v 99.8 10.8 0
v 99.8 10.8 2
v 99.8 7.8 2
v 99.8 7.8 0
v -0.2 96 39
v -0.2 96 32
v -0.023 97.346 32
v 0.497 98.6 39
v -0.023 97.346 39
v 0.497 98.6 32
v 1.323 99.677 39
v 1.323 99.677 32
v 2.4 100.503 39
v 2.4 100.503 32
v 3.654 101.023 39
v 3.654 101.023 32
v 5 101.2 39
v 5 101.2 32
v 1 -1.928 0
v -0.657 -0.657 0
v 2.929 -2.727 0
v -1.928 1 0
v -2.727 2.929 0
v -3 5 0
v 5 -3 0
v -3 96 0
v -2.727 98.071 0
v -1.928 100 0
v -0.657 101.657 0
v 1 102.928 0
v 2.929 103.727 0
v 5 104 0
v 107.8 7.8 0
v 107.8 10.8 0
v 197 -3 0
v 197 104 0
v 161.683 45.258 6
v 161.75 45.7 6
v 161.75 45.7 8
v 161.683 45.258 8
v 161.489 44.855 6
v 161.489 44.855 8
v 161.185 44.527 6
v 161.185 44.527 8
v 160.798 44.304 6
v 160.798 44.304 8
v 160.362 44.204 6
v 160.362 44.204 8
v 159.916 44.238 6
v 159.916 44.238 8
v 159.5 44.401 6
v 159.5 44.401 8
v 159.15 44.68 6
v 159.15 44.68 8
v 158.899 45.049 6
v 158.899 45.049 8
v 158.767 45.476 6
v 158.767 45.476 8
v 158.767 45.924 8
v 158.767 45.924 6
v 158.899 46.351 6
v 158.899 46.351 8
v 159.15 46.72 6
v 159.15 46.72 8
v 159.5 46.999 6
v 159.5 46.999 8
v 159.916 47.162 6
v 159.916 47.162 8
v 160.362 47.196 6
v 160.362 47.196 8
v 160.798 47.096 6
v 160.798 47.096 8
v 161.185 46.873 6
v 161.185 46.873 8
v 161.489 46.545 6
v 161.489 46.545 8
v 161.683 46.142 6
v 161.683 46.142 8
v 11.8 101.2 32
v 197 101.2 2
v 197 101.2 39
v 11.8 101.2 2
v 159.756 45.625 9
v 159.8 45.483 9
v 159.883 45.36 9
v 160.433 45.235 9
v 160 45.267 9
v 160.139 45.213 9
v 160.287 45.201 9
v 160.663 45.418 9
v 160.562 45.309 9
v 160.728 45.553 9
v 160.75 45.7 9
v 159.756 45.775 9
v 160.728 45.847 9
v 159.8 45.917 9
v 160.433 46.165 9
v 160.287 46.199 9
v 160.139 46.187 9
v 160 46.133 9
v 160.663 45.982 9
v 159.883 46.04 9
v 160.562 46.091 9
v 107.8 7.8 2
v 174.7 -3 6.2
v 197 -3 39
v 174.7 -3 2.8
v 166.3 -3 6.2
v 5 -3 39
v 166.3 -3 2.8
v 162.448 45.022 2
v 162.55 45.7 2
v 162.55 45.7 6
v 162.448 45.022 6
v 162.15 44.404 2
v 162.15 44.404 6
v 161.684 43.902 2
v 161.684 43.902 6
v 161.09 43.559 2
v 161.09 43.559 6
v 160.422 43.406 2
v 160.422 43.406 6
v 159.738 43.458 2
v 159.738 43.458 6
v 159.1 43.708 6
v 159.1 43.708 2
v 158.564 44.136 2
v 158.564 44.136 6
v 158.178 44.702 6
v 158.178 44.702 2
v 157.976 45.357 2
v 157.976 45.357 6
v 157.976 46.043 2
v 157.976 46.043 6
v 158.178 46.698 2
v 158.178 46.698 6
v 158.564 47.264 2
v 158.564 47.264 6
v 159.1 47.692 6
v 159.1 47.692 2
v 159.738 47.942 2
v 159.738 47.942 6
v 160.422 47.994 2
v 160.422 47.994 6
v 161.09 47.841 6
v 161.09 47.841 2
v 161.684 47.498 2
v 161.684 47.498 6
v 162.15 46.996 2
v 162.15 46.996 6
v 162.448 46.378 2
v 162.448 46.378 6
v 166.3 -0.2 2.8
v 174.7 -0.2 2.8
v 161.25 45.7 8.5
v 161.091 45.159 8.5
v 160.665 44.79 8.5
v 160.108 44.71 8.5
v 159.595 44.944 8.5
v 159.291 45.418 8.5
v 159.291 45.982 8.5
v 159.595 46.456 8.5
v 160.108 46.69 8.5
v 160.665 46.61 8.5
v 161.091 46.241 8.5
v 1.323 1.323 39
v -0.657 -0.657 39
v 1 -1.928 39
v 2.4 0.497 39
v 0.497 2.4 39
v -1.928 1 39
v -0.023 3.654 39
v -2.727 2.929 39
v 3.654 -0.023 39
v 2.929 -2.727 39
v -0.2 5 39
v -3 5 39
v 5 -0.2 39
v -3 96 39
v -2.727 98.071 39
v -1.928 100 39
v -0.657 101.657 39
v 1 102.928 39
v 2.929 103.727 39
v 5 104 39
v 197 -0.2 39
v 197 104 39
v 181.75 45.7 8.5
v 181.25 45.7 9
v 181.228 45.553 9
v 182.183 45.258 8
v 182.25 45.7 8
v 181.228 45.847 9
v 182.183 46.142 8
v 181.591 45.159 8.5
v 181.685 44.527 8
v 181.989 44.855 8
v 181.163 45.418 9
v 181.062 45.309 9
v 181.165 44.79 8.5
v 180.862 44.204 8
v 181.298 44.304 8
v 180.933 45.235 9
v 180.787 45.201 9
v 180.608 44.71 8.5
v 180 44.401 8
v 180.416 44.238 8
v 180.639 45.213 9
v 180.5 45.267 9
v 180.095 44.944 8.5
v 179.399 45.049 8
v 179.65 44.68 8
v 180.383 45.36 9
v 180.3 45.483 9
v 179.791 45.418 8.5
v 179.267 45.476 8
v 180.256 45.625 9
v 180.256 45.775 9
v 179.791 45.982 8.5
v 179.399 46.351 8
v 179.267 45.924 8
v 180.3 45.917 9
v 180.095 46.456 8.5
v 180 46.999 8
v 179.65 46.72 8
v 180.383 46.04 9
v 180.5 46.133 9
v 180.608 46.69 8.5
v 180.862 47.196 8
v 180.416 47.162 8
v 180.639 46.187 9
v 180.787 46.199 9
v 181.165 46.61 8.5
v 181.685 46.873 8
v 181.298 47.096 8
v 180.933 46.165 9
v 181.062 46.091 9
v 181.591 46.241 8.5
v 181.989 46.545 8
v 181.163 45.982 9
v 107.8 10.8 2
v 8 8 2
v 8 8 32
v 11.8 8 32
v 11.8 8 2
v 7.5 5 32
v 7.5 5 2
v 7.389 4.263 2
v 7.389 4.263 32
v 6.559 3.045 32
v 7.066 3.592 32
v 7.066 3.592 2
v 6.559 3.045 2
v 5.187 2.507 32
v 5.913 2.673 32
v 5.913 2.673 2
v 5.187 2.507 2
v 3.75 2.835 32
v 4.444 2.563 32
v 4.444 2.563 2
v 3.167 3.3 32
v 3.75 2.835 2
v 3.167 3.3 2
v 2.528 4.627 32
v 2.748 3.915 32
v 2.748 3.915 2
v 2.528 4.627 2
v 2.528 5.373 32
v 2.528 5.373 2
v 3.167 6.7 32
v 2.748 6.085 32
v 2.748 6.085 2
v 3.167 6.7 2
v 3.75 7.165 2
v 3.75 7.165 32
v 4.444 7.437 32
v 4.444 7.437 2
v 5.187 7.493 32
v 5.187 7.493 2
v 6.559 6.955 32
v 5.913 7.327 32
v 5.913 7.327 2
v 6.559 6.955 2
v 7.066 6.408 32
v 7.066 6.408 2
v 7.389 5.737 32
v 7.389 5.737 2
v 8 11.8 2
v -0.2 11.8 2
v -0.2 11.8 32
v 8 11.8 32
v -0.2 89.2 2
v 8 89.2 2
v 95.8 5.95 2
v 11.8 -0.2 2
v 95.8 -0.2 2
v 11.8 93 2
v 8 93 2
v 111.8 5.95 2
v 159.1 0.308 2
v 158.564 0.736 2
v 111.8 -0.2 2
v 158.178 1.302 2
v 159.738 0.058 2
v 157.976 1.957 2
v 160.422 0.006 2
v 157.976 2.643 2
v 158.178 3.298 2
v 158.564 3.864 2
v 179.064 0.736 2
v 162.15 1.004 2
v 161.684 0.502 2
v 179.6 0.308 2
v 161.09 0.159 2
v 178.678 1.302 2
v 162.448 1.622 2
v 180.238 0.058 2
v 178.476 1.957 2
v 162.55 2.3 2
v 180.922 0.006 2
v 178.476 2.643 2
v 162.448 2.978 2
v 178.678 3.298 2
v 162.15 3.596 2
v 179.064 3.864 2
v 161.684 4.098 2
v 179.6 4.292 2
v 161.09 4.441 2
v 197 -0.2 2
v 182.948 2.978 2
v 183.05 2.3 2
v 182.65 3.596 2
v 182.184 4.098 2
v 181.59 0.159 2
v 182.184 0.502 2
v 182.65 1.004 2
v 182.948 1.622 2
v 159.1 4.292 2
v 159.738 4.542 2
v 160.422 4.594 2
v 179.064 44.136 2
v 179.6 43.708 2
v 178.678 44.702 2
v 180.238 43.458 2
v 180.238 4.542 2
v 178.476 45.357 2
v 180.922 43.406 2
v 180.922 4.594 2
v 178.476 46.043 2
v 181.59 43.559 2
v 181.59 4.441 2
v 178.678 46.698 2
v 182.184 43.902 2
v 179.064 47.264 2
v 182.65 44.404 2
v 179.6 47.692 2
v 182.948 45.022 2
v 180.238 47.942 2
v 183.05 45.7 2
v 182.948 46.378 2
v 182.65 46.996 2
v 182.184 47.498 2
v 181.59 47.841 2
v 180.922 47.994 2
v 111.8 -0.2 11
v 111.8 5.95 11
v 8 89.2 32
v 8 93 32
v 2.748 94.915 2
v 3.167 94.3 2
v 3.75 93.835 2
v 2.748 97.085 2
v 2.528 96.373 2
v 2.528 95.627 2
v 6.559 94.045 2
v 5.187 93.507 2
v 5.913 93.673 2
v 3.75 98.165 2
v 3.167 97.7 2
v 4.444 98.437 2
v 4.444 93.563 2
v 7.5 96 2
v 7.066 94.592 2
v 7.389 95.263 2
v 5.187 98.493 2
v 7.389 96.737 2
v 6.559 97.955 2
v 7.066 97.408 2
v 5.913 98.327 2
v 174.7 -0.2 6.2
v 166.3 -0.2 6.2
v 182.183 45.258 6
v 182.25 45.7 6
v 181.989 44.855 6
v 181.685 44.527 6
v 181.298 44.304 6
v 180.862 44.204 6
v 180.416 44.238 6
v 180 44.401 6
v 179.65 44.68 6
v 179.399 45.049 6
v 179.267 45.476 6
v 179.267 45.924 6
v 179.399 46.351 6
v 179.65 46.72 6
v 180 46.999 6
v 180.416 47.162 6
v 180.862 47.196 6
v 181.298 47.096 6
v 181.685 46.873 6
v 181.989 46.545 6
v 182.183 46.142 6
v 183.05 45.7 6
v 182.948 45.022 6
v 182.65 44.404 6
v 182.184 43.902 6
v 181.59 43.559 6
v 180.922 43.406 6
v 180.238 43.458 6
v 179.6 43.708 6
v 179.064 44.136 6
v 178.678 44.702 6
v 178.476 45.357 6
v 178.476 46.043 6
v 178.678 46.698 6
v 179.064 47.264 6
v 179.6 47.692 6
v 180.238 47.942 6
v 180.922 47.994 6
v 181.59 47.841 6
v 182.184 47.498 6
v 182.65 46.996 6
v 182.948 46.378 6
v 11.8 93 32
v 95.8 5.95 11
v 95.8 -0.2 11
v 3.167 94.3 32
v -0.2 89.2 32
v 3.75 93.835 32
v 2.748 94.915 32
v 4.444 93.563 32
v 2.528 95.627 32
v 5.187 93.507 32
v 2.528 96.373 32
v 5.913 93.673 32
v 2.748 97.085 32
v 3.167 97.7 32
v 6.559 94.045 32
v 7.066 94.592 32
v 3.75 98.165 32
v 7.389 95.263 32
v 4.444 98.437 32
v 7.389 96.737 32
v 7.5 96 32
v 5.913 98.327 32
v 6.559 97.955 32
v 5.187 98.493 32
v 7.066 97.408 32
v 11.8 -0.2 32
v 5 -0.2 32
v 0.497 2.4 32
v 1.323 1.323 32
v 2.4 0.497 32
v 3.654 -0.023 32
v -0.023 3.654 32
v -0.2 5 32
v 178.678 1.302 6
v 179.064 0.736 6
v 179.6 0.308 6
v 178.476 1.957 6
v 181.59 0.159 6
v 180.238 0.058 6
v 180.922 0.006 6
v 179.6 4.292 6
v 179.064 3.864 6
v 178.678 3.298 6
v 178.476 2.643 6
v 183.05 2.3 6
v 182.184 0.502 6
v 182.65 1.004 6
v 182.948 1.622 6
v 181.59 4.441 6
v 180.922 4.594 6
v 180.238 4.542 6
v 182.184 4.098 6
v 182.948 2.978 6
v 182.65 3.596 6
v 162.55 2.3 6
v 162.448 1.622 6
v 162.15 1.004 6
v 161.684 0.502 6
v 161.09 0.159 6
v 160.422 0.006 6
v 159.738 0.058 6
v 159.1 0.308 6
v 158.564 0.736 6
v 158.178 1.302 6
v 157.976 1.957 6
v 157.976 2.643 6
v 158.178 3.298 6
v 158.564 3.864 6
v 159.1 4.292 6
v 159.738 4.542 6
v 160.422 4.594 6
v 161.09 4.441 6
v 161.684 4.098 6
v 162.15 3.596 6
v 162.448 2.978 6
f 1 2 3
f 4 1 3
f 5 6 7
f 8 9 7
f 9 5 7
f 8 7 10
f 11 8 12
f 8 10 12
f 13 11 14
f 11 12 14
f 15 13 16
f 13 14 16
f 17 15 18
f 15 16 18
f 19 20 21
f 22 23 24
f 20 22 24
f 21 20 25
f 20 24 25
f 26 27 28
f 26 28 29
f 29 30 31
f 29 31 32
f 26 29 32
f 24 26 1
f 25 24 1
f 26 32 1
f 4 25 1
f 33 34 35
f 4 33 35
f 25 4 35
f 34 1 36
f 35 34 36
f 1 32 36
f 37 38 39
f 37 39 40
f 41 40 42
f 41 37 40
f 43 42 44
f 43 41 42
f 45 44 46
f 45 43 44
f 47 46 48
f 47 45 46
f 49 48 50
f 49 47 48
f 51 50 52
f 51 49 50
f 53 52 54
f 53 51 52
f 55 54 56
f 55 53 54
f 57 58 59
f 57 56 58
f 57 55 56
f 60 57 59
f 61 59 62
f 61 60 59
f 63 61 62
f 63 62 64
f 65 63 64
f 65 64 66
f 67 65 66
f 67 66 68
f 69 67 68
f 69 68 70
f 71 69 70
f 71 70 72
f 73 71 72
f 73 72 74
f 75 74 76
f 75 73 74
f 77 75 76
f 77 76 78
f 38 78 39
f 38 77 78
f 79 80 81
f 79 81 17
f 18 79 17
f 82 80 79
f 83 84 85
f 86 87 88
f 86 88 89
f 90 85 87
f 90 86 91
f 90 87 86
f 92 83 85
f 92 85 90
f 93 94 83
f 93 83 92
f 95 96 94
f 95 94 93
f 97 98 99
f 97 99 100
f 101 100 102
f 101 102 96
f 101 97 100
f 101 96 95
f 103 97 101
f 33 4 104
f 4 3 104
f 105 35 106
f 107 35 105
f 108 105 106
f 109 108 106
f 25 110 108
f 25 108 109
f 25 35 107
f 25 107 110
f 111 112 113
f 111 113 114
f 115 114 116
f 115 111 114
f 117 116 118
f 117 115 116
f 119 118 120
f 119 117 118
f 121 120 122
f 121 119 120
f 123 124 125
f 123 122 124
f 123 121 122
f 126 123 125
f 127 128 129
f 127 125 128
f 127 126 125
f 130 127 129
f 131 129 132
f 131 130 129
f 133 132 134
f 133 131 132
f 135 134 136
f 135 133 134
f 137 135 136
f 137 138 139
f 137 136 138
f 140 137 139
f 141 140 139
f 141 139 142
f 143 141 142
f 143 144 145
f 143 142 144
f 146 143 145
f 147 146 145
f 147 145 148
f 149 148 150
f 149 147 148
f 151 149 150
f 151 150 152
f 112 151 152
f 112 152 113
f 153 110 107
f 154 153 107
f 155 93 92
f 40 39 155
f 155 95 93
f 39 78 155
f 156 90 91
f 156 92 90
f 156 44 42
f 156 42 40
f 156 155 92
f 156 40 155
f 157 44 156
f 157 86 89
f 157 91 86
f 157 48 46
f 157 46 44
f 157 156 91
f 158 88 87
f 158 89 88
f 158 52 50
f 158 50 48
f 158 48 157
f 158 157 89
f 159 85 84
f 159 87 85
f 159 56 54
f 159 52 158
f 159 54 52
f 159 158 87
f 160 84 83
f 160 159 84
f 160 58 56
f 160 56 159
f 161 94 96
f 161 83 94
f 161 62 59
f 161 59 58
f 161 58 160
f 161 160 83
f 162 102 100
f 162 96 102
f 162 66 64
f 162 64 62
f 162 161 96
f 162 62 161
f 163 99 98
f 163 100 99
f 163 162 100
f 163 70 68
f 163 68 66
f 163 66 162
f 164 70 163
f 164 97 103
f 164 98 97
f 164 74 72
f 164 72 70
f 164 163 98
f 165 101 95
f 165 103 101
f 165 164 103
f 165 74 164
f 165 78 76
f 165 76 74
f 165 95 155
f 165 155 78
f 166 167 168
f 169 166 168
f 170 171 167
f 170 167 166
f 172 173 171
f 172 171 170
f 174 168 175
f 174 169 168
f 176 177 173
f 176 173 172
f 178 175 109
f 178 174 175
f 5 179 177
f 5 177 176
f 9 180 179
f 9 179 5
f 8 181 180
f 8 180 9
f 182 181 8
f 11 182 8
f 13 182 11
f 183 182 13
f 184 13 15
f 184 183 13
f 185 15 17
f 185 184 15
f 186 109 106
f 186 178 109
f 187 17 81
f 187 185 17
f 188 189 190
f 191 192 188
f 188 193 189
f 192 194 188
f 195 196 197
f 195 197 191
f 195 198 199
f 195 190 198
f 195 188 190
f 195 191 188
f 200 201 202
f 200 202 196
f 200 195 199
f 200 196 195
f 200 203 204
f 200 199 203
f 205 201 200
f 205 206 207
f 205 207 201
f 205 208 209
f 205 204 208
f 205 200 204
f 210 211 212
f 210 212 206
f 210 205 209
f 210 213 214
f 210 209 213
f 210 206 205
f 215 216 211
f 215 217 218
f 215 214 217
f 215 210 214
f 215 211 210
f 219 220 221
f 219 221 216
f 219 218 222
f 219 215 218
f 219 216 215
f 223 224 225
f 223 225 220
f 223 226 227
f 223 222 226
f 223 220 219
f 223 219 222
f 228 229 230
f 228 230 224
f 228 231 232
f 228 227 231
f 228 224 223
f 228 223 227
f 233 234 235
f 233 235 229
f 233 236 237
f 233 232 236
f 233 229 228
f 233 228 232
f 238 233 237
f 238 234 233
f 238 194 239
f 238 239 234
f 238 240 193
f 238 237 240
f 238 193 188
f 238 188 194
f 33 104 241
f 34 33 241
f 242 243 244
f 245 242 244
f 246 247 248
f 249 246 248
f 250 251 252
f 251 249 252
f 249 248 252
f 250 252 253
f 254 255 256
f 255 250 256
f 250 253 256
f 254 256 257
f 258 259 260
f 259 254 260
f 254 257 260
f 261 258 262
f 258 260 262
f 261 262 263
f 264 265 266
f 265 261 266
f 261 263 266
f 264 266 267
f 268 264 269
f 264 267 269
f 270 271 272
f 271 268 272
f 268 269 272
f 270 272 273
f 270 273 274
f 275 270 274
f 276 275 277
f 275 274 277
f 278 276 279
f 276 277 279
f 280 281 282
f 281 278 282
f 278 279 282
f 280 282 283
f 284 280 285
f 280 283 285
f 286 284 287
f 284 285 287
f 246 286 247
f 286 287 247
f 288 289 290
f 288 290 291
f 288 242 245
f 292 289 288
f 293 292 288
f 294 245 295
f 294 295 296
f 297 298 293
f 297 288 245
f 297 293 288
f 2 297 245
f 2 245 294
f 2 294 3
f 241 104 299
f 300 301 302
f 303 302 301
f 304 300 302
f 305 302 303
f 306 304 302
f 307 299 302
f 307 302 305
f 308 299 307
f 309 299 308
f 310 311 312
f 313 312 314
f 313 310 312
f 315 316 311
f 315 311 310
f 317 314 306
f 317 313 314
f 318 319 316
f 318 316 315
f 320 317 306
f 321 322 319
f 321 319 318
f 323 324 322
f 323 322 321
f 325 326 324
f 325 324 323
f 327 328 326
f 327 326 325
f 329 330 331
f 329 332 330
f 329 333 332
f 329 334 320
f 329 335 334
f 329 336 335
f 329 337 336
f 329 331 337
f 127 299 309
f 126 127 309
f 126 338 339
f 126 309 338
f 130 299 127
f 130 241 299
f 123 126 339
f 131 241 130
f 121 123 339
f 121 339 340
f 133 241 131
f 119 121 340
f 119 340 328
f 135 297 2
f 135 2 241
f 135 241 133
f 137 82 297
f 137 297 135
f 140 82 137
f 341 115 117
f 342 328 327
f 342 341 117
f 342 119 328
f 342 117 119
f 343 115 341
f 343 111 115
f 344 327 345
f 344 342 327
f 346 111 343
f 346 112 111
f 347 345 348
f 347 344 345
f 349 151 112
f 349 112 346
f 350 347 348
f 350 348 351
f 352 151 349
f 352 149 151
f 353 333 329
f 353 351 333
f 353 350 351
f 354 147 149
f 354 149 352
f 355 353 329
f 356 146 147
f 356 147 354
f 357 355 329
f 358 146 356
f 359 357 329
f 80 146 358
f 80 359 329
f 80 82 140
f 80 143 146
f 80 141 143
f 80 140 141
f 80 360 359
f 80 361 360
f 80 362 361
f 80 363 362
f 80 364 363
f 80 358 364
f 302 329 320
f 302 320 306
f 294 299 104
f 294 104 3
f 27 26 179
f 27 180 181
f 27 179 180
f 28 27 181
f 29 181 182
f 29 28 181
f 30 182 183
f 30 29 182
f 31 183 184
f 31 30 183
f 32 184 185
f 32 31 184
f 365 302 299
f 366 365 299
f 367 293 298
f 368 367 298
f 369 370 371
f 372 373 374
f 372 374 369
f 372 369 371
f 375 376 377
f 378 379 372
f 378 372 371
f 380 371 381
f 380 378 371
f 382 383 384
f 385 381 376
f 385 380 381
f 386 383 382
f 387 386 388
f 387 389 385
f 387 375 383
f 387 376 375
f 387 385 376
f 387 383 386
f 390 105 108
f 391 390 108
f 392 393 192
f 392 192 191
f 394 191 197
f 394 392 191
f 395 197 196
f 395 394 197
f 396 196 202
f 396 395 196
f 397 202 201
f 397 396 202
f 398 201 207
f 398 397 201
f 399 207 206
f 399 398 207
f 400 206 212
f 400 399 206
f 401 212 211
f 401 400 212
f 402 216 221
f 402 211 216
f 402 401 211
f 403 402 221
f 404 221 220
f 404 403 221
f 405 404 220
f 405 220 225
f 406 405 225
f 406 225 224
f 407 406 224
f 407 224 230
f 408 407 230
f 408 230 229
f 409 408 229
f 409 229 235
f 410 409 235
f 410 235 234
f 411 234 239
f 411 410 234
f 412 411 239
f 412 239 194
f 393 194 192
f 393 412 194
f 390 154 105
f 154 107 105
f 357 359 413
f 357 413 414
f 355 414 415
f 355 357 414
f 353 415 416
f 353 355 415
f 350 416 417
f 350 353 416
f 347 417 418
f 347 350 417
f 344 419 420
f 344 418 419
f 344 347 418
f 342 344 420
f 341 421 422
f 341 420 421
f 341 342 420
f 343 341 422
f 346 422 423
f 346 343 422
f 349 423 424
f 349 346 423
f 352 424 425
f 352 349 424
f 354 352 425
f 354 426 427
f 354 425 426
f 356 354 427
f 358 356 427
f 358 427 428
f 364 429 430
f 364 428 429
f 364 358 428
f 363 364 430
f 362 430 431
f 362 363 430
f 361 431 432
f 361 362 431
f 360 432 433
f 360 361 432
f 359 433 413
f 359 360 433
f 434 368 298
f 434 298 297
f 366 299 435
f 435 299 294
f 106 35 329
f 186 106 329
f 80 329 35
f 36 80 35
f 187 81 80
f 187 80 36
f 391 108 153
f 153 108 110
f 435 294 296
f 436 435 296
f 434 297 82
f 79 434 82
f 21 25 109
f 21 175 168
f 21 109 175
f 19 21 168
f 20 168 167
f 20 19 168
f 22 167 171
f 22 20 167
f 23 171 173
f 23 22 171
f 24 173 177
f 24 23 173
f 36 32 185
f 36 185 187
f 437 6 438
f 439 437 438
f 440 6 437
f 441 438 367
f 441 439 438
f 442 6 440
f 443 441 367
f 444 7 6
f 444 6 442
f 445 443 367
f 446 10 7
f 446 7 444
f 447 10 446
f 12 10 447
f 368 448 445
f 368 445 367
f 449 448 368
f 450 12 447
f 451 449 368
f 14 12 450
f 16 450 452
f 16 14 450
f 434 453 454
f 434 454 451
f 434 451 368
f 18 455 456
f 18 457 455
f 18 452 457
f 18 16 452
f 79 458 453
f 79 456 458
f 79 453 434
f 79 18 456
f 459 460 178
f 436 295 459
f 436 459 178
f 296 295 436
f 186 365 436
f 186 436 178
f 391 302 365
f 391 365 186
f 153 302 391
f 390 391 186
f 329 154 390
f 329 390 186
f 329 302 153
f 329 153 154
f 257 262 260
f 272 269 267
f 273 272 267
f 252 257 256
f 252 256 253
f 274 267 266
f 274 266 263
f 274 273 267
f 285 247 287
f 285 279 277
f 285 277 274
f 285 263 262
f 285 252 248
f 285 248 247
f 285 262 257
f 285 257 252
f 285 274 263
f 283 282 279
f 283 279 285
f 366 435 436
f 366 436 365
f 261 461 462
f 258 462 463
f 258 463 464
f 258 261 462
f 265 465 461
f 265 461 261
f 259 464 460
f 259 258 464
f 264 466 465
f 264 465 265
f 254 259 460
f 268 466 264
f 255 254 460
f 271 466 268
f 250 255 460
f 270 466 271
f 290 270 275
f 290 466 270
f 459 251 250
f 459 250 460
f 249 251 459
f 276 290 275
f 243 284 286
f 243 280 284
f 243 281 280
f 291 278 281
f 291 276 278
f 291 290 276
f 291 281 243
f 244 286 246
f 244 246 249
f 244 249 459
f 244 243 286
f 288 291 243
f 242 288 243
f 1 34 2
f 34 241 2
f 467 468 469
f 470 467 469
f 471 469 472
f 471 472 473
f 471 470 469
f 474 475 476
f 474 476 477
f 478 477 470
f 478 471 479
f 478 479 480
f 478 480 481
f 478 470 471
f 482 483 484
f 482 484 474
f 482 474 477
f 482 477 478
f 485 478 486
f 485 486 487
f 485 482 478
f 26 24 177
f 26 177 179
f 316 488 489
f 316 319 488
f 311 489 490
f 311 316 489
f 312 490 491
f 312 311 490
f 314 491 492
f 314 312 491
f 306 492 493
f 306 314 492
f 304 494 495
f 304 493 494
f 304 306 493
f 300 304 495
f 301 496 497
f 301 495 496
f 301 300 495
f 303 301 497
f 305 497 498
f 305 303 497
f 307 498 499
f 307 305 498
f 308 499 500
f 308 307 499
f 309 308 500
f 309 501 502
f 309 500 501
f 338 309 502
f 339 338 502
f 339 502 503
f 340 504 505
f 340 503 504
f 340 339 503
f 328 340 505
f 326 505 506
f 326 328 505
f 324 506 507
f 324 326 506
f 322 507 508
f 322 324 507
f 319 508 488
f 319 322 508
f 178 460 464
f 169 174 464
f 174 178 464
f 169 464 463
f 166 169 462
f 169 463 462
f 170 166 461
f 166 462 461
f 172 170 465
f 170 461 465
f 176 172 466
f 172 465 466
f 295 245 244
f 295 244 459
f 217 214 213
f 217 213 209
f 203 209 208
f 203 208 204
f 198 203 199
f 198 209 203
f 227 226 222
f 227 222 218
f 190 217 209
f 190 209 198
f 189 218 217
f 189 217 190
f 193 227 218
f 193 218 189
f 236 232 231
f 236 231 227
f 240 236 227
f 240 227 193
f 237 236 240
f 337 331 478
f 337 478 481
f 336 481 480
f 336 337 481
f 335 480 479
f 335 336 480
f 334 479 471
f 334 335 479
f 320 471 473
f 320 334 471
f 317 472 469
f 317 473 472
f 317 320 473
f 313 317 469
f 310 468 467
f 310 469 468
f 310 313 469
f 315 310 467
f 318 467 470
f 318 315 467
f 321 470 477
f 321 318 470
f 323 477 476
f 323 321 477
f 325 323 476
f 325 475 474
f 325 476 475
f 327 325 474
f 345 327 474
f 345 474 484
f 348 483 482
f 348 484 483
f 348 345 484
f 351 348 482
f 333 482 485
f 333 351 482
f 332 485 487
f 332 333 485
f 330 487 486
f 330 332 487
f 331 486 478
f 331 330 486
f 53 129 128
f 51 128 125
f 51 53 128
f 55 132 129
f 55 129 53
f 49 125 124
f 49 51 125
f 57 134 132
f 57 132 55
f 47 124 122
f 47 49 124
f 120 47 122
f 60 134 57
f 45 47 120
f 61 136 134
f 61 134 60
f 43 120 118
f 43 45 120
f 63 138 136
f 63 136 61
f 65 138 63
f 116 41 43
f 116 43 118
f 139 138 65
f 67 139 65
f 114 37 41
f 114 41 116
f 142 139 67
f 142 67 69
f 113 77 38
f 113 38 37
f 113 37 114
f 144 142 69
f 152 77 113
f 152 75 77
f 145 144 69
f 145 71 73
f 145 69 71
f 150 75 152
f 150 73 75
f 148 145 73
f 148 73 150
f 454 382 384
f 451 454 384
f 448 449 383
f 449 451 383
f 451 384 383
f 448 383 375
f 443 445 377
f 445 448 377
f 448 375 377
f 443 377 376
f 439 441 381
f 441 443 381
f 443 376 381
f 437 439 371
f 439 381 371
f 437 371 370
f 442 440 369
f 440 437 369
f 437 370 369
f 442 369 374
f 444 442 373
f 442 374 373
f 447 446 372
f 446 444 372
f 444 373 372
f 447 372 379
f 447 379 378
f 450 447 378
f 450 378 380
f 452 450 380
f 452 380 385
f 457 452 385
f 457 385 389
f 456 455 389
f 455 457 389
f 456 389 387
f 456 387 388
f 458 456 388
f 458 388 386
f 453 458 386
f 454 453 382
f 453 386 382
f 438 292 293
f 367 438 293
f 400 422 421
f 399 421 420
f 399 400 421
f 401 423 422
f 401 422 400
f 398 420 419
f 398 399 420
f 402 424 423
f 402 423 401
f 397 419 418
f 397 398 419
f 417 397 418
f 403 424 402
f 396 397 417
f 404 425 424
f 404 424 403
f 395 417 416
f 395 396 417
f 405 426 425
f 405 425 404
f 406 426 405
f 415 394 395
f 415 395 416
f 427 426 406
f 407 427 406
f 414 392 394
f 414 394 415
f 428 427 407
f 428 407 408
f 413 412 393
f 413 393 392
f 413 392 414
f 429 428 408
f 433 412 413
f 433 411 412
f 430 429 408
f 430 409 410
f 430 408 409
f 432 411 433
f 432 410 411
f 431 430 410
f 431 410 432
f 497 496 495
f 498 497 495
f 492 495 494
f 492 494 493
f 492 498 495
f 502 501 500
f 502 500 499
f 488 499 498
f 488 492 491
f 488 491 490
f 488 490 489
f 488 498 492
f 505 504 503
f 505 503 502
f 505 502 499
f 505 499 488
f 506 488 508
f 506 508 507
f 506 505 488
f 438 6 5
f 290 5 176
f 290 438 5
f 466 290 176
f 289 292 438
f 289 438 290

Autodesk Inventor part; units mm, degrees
ref_plane "YZ Plane" through (0, 0, 0) normal (1, 0, 0) x (0, 1, 0)
ref_plane "XZ Plane" through (0, 0, 0) normal (0, 1, 0) x (-1, 0, 0)
ref_plane "XY Plane" through (0, 0, 0) normal (0, 0, 1) x (1, 0, 0)
sketch "Sketch1" plane through (0, 0, 0) normal (0, 0, 1) x (1, 0, 0)
  line L0 (5, 0) -> (336, 0)
  line L1 (341, 5) -> (341, 96)
  line L2 (336, 101) -> (5, 101)
  line L3 (0, 96) -> (0, 5)
  arc A0 (5, 101) -> (0, 96) centre (5, 96) ccw
  arc A1 (0, 5) -> (5, 0) centre (5, 5) ccw
  arc A2 (341, 96) -> (336, 101) centre (336, 96) ccw
  arc A3 (336, 0) -> (341, 5) centre (336, 5) ccw
  line L4 (5, 101.2) -> (336, 101.2)
  arc A4 (341.2, 96) -> (336, 101.2) centre (336, 96) ccw
  line L5 (341.2, 96) -> (341.2, 5)
  arc A5 (336, -0.2) -> (341.2, 5) centre (336, 5) ccw
  line L6 (336, -0.2) -> (5, -0.2)
  arc A6 (-0.2, 5) -> (5, -0.2) centre (5, 5) ccw
  line L7 (-0.2, 5) -> (-0.2, 96)
  arc A7 (5, 101.2) -> (-0.2, 96) centre (5, 96) ccw
  line L8 (5, 104) -> (336, 104)
  arc A8 (344, 96) -> (336, 104) centre (336, 96) ccw
  line L9 (344, 96) -> (344, 5)
  arc A9 (336, -3) -> (344, 5) centre (336, 5) ccw
  line L10 (336, -3) -> (5, -3)
  arc A10 (-3, 5) -> (5, -3) centre (5, 5) ccw
  line L11 (-3, 5) -> (-3, 96)
  arc A11 (5, 104) -> (-3, 96) centre (5, 96) ccw
  point P0 (0, 0)
  point P1 (341, 101)
  point P2 (0, 101)
  dimension "d0" = 341
  dimension "d1" = 101
  dimension "d2" = 5
  dimension "d3" = 0.2
  dimension "d4" = 3
extrude "Extrusion1" add sketch "Sketch1" along normal blind 2 contours A1 L3 A0 L2 A2 L1 A3 L0 | L4 A4 L5 A5 L6 A6 L7 A7 | L8 A8 L9 A9 L10 A10 L11 A11
sketch "Sketch2" plane through (0, 0, 2) normal (0, 0, 1) x (1, 0, 0)
  line L0 (5, 104) -> (336, 104)
  line L1 (344, 96) -> (344, 5)
  line L2 (336, -3) -> (5, -3)
  line L3 (-3, 5) -> (-3, 96)
  line L4 (344, 5) -> (344, 96) projected
  line L5 (5, -3) -> (336, -3) projected
  arc A0 (5, 104) -> (-3, 96) centre (5, 96) ccw
  arc A1 (-3, 5) -> (5, -3) centre (5, 5) ccw
  arc A2 (336, -3) -> (344, 5) centre (336, 5) ccw
  arc A3 (344, 96) -> (336, 104) centre (336, 96) ccw
  line L6 (336, 101.2) -> (5, 101.2)
  arc A4 (5, 101.2) -> (-0.2, 96) centre (5, 96) ccw
  line L7 (-0.2, 96) -> (-0.2, 5)
  arc A5 (-0.2, 5) -> (5, -0.2) centre (5, 5) ccw
  line L8 (5, -0.2) -> (336, -0.2)
  arc A6 (336, -0.2) -> (341.2, 5) centre (336, 5) ccw
  line L9 (341.2, 5) -> (341.2, 96)
  arc A7 (341.2, 96) -> (336, 101.2) centre (336, 96) ccw
  circle A8 centre (5, 96) radius 2.5
  line L10 (9, 92) -> (332, 92)
  line L11 (332, 92) -> (332, 9)
  line L12 (332, 9) -> (9, 9)
  line L13 (9, 9) -> (9, 92)
  line L14 (-0.2, 89.2) -> (8, 89.2)
  line L15 (8, 89.2) -> (8, 93)
  line L16 (8, 93) -> (11.8, 93)
  line L17 (11.8, 93) -> (11.8, 101.2)
  line L18 (9, 9) -> (332, 92)
  line L19 (170.5, 64.427) -> (170.5, 38.8649)
  line L20 (118.7328, 50.5) -> (212.1169, 50.5)
  circle A9 centre (336, 96) radius 2.5
  line L21 (341.2, 89.2) -> (333, 89.2)
  line L22 (333, 89.2) -> (333, 93)
  line L23 (333, 93) -> (329.2, 93)
  line L24 (329.2, 93) -> (329.2, 101.2)
  circle A10 centre (5, 5) radius 2.5
  line L25 (-0.2, 11.8) -> (8, 11.8)
  line L26 (8, 11.8) -> (8, 8)
  line L27 (8, 8) -> (11.8, 8)
  line L28 (11.8, 8) -> (11.8, -0.2)
  line L29 (329.2, 8) -> (329.2, -0.2)
  line L30 (333, 8) -> (329.2, 8)
  line L31 (333, 11.8) -> (333, 8)
  line L32 (341.2, 11.8) -> (333, 11.8)
  circle A11 centre (336, 5) radius 2.5
  point P0 (0, 0)
  dimension "d7" = 0
  dimension "d8" = 0
  dimension "d9" = 8
  dimension "d10" = 2.8
  dimension "d11" = 5
  dimension "d12" = 5.2
  dimension "d13" = 5.2
  dimension "d19" = 9.2
  dimension "d20" = 9.2
  dimension "d21" = 9.2
  dimension "d22" = 9.2
  dimension "d23" = 1
  dimension "d24" = 1
  dimension "d25" = 12
  dimension "d26" = 12
extrude "Extrusion2" add sketch "Sketch2" along normal blind 30 contours L0 A3 L1 A2 L2 A1 L3 A0 | A7 L9 L21 L22 L23 L24 L6 | L17 L16 L15 L14 L7 A4 L6 | L9 A6 L8 L29 L30 L31 L32 | L25 L26 L27 L28 L8 A5 L7
sketch "Sketch3" plane through (0, 0, 32) normal (0, 0, 1) x (1, 0, 0)
  line L0 (5, 104) -> (336, 104)
  line L1 (344, 96) -> (344, 5)
  line L2 (336, -3) -> (5, -3)
  line L3 (-3, 5) -> (-3, 96)
  arc A0 (5, 104) -> (-3, 96) centre (5, 96) ccw
  arc A1 (-3, 5) -> (5, -3) centre (5, 5) ccw
  arc A2 (336, -3) -> (344, 5) centre (336, 5) ccw
  arc A3 (344, 96) -> (336, 104) centre (336, 96) ccw
  line L4 (336, 101.2) -> (5, 101.2)
  arc A4 (5, 101.2) -> (-0.2, 96) centre (5, 96) ccw
  line L5 (-0.2, 96) -> (-0.2, 5)
  arc A5 (-0.2, 5) -> (5, -0.2) centre (5, 5) ccw
  line L6 (5, -0.2) -> (336, -0.2)
  arc A6 (336, -0.2) -> (341.2, 5) centre (336, 5) ccw
  line L7 (341.2, 5) -> (341.2, 96)
  arc A7 (341.2, 96) -> (336, 101.2) centre (336, 96) ccw
  point P0 (0, 0)
  dimension "d29" = 8
  dimension "d30" = 2.8
extrude "Extrusion3" add sketch "Sketch3" along normal blind 7
sketch "Sketch4" plane through (0, 0, 2) normal (0, 0, 1) x (1, 0, 0)
  line L0 (336, -0.2) -> (5, -0.2) projected
  line L1 (157.75, -0.2) -> (183.25, -0.2)
  line L2 (183.25, -0.2) -> (183.25, 48.2)
  line L3 (183.25, 48.2) -> (157.75, 48.2)
  line L4 (157.75, 48.2) -> (157.75, -0.2)
  line L5 (-0.2, 5) -> (-0.2, 96) projected
  circle A0 centre (160.25, 45.7) radius 2.3
  circle A1 centre (180.75, 45.7) radius 2.3
  circle A2 centre (160.25, 2.3) radius 2.3
  circle A3 centre (180.75, 2.3) radius 2.3
  point P0 (0, 0)
  dimension "d33" = 25.5
  dimension "d34" = 48.4
  dimension "d35" = 157.95
  dimension "d36" = 4.6
  dimension "d37" = 4.6
  dimension "d38" = 4.6
  dimension "d39" = 4.6
  dimension "d40" = 2.5
  dimension "d41" = 2.5
  dimension "d42" = 2.5
  dimension "d43" = 2.5
  dimension "d44" = 2.5
  dimension "d45" = 2.5
  dimension "d46" = 2.5
  dimension "d47" = 2.5
extrude "Extrusion4" add sketch "Sketch4" along normal blind 4 contours A0 | A1 | A2 | A3
sketch "Sketch5" plane through (160.25, 2.3, 6) normal (0, 0, 1) x (1, 0, 0)
  circle A0 centre (0, 43.4) radius 2.3 projected
  circle A1 centre (0, 43.4) radius 1.5
  circle A2 centre (20.5, 43.4) radius 2.3 projected
  circle A3 centre (20.5, 43.4) radius 1.5
  circle A4 centre (0, 0) radius 2.3 projected
  circle A5 centre (0, 0) radius 1.5
  circle A6 centre (20.5, 0) radius 2.3 projected
  circle A7 centre (20.5, 0) radius 1.5
  point P0 (-160.25, -2.3)
  dimension "d50" = 3
  dimension "d51" = 3
  dimension "d52" = 3
  dimension "d53" = 3
extrude "Extrusion5" add sketch "Sketch5" along normal blind 3 contours A1 | A3
chamfer "Chamfer1" distance 1 angle 45 2 edges at (158.75, 45.7, 9) (179.25, 45.7, 9)
sketch "Sketch6" plane through (5, -3, 0) normal (0, -1, 0) x (1, 0, 0)
  line L0 (161.3, 2.8) -> (169.7, 2.8)
  line L1 (169.7, 2.8) -> (169.7, 6.2)
  line L2 (169.7, 6.2) -> (161.3, 6.2)
  line L3 (161.3, 6.2) -> (161.3, 2.8)
  line L4 (6.8, 2) -> (324.2, 2) projected
  line L5 (0, 0) -> (0, 39) projected
  point P0 (-5, 0)
  dimension "d59" = 8.4
  dimension "d60" = 3.4
  dimension "d61" = 4.2
  dimension "d62" = 161.3
extrude "Extrusion6" cut sketch "Sketch6" against normal blind 3
sketch "Sketch7" plane through (0, 0, 2) normal (0, 0, 1) x (1, 0, 0)
  line L0 (99.8, 7.8) -> (107.8, 7.8)
  line L1 (107.8, 7.8) -> (107.8, 10.8)
  line L2 (107.8, 10.8) -> (99.8, 10.8)
  line L3 (99.8, 10.8) -> (99.8, 7.8)
  line L4 (336, -0.2) -> (5, -0.2) projected
  line L5 (-0.2, 5) -> (-0.2, 96) projected
  point P0 (0, 0)
  dimension "d65" = 8
  dimension "d66" = 3
  dimension "d67" = 8
  dimension "d68" = 100
extrude "Extrusion7" cut sketch "Sketch7" against normal blind 3
sketch "Sketch8" plane through (0, 0, 2) normal (0, 0, 1) x (1, 0, 0)
  line L0 (11.8, -0.2) -> (329.2, -0.2) projected
  line L1 (95.8, -0.2) -> (111.8, -0.2)
  line L2 (111.8, -0.2) -> (111.8, 5.95)
  line L3 (111.8, 5.95) -> (95.8, 5.95)
  line L4 (95.8, 5.95) -> (95.8, -0.2)
  line L5 (107.8, 7.8) -> (99.8, 7.8) projected
  line L6 (99.8, 7.8) -> (99.8, 10.8) projected
  point P0 (0, 0)
  dimension "d71" = 16
  dimension "d72" = 1.85
  dimension "d73" = 4
extrude "Extrusion8" add sketch "Sketch8" along normal blind 9
sketch "Sketch9" plane through (0, 0, 39) normal (0, 0, 1) x (1, 0, 0)
  line L0 (-3, -16.474) -> (197, -16.474)
  line L1 (197, -16.474) -> (197, 116.8419)
  line L2 (197, 116.8419) -> (-3, 116.8419)
  line L3 (-3, 116.8419) -> (-3, -16.474)
  line L4 (-3, 96) -> (-3, 5) projected
  line L5 (197, 116.8419) -> (375.2281, 116.8419)
  line L6 (375.2281, 116.8419) -> (375.2281, -16.474)
  line L7 (375.2281, -16.474) -> (197, -16.474)
  line L8 (197, -16.474) -> (197, 116.8419)
  point P0 (0, 0)
  dimension "d76" = 200
  dimension "d77" = 0
extrude "Extrusion9" cut sketch "Sketch9" against normal blind 50 contours L1 L5 L6 L7
properties part number "Case Left Half"
